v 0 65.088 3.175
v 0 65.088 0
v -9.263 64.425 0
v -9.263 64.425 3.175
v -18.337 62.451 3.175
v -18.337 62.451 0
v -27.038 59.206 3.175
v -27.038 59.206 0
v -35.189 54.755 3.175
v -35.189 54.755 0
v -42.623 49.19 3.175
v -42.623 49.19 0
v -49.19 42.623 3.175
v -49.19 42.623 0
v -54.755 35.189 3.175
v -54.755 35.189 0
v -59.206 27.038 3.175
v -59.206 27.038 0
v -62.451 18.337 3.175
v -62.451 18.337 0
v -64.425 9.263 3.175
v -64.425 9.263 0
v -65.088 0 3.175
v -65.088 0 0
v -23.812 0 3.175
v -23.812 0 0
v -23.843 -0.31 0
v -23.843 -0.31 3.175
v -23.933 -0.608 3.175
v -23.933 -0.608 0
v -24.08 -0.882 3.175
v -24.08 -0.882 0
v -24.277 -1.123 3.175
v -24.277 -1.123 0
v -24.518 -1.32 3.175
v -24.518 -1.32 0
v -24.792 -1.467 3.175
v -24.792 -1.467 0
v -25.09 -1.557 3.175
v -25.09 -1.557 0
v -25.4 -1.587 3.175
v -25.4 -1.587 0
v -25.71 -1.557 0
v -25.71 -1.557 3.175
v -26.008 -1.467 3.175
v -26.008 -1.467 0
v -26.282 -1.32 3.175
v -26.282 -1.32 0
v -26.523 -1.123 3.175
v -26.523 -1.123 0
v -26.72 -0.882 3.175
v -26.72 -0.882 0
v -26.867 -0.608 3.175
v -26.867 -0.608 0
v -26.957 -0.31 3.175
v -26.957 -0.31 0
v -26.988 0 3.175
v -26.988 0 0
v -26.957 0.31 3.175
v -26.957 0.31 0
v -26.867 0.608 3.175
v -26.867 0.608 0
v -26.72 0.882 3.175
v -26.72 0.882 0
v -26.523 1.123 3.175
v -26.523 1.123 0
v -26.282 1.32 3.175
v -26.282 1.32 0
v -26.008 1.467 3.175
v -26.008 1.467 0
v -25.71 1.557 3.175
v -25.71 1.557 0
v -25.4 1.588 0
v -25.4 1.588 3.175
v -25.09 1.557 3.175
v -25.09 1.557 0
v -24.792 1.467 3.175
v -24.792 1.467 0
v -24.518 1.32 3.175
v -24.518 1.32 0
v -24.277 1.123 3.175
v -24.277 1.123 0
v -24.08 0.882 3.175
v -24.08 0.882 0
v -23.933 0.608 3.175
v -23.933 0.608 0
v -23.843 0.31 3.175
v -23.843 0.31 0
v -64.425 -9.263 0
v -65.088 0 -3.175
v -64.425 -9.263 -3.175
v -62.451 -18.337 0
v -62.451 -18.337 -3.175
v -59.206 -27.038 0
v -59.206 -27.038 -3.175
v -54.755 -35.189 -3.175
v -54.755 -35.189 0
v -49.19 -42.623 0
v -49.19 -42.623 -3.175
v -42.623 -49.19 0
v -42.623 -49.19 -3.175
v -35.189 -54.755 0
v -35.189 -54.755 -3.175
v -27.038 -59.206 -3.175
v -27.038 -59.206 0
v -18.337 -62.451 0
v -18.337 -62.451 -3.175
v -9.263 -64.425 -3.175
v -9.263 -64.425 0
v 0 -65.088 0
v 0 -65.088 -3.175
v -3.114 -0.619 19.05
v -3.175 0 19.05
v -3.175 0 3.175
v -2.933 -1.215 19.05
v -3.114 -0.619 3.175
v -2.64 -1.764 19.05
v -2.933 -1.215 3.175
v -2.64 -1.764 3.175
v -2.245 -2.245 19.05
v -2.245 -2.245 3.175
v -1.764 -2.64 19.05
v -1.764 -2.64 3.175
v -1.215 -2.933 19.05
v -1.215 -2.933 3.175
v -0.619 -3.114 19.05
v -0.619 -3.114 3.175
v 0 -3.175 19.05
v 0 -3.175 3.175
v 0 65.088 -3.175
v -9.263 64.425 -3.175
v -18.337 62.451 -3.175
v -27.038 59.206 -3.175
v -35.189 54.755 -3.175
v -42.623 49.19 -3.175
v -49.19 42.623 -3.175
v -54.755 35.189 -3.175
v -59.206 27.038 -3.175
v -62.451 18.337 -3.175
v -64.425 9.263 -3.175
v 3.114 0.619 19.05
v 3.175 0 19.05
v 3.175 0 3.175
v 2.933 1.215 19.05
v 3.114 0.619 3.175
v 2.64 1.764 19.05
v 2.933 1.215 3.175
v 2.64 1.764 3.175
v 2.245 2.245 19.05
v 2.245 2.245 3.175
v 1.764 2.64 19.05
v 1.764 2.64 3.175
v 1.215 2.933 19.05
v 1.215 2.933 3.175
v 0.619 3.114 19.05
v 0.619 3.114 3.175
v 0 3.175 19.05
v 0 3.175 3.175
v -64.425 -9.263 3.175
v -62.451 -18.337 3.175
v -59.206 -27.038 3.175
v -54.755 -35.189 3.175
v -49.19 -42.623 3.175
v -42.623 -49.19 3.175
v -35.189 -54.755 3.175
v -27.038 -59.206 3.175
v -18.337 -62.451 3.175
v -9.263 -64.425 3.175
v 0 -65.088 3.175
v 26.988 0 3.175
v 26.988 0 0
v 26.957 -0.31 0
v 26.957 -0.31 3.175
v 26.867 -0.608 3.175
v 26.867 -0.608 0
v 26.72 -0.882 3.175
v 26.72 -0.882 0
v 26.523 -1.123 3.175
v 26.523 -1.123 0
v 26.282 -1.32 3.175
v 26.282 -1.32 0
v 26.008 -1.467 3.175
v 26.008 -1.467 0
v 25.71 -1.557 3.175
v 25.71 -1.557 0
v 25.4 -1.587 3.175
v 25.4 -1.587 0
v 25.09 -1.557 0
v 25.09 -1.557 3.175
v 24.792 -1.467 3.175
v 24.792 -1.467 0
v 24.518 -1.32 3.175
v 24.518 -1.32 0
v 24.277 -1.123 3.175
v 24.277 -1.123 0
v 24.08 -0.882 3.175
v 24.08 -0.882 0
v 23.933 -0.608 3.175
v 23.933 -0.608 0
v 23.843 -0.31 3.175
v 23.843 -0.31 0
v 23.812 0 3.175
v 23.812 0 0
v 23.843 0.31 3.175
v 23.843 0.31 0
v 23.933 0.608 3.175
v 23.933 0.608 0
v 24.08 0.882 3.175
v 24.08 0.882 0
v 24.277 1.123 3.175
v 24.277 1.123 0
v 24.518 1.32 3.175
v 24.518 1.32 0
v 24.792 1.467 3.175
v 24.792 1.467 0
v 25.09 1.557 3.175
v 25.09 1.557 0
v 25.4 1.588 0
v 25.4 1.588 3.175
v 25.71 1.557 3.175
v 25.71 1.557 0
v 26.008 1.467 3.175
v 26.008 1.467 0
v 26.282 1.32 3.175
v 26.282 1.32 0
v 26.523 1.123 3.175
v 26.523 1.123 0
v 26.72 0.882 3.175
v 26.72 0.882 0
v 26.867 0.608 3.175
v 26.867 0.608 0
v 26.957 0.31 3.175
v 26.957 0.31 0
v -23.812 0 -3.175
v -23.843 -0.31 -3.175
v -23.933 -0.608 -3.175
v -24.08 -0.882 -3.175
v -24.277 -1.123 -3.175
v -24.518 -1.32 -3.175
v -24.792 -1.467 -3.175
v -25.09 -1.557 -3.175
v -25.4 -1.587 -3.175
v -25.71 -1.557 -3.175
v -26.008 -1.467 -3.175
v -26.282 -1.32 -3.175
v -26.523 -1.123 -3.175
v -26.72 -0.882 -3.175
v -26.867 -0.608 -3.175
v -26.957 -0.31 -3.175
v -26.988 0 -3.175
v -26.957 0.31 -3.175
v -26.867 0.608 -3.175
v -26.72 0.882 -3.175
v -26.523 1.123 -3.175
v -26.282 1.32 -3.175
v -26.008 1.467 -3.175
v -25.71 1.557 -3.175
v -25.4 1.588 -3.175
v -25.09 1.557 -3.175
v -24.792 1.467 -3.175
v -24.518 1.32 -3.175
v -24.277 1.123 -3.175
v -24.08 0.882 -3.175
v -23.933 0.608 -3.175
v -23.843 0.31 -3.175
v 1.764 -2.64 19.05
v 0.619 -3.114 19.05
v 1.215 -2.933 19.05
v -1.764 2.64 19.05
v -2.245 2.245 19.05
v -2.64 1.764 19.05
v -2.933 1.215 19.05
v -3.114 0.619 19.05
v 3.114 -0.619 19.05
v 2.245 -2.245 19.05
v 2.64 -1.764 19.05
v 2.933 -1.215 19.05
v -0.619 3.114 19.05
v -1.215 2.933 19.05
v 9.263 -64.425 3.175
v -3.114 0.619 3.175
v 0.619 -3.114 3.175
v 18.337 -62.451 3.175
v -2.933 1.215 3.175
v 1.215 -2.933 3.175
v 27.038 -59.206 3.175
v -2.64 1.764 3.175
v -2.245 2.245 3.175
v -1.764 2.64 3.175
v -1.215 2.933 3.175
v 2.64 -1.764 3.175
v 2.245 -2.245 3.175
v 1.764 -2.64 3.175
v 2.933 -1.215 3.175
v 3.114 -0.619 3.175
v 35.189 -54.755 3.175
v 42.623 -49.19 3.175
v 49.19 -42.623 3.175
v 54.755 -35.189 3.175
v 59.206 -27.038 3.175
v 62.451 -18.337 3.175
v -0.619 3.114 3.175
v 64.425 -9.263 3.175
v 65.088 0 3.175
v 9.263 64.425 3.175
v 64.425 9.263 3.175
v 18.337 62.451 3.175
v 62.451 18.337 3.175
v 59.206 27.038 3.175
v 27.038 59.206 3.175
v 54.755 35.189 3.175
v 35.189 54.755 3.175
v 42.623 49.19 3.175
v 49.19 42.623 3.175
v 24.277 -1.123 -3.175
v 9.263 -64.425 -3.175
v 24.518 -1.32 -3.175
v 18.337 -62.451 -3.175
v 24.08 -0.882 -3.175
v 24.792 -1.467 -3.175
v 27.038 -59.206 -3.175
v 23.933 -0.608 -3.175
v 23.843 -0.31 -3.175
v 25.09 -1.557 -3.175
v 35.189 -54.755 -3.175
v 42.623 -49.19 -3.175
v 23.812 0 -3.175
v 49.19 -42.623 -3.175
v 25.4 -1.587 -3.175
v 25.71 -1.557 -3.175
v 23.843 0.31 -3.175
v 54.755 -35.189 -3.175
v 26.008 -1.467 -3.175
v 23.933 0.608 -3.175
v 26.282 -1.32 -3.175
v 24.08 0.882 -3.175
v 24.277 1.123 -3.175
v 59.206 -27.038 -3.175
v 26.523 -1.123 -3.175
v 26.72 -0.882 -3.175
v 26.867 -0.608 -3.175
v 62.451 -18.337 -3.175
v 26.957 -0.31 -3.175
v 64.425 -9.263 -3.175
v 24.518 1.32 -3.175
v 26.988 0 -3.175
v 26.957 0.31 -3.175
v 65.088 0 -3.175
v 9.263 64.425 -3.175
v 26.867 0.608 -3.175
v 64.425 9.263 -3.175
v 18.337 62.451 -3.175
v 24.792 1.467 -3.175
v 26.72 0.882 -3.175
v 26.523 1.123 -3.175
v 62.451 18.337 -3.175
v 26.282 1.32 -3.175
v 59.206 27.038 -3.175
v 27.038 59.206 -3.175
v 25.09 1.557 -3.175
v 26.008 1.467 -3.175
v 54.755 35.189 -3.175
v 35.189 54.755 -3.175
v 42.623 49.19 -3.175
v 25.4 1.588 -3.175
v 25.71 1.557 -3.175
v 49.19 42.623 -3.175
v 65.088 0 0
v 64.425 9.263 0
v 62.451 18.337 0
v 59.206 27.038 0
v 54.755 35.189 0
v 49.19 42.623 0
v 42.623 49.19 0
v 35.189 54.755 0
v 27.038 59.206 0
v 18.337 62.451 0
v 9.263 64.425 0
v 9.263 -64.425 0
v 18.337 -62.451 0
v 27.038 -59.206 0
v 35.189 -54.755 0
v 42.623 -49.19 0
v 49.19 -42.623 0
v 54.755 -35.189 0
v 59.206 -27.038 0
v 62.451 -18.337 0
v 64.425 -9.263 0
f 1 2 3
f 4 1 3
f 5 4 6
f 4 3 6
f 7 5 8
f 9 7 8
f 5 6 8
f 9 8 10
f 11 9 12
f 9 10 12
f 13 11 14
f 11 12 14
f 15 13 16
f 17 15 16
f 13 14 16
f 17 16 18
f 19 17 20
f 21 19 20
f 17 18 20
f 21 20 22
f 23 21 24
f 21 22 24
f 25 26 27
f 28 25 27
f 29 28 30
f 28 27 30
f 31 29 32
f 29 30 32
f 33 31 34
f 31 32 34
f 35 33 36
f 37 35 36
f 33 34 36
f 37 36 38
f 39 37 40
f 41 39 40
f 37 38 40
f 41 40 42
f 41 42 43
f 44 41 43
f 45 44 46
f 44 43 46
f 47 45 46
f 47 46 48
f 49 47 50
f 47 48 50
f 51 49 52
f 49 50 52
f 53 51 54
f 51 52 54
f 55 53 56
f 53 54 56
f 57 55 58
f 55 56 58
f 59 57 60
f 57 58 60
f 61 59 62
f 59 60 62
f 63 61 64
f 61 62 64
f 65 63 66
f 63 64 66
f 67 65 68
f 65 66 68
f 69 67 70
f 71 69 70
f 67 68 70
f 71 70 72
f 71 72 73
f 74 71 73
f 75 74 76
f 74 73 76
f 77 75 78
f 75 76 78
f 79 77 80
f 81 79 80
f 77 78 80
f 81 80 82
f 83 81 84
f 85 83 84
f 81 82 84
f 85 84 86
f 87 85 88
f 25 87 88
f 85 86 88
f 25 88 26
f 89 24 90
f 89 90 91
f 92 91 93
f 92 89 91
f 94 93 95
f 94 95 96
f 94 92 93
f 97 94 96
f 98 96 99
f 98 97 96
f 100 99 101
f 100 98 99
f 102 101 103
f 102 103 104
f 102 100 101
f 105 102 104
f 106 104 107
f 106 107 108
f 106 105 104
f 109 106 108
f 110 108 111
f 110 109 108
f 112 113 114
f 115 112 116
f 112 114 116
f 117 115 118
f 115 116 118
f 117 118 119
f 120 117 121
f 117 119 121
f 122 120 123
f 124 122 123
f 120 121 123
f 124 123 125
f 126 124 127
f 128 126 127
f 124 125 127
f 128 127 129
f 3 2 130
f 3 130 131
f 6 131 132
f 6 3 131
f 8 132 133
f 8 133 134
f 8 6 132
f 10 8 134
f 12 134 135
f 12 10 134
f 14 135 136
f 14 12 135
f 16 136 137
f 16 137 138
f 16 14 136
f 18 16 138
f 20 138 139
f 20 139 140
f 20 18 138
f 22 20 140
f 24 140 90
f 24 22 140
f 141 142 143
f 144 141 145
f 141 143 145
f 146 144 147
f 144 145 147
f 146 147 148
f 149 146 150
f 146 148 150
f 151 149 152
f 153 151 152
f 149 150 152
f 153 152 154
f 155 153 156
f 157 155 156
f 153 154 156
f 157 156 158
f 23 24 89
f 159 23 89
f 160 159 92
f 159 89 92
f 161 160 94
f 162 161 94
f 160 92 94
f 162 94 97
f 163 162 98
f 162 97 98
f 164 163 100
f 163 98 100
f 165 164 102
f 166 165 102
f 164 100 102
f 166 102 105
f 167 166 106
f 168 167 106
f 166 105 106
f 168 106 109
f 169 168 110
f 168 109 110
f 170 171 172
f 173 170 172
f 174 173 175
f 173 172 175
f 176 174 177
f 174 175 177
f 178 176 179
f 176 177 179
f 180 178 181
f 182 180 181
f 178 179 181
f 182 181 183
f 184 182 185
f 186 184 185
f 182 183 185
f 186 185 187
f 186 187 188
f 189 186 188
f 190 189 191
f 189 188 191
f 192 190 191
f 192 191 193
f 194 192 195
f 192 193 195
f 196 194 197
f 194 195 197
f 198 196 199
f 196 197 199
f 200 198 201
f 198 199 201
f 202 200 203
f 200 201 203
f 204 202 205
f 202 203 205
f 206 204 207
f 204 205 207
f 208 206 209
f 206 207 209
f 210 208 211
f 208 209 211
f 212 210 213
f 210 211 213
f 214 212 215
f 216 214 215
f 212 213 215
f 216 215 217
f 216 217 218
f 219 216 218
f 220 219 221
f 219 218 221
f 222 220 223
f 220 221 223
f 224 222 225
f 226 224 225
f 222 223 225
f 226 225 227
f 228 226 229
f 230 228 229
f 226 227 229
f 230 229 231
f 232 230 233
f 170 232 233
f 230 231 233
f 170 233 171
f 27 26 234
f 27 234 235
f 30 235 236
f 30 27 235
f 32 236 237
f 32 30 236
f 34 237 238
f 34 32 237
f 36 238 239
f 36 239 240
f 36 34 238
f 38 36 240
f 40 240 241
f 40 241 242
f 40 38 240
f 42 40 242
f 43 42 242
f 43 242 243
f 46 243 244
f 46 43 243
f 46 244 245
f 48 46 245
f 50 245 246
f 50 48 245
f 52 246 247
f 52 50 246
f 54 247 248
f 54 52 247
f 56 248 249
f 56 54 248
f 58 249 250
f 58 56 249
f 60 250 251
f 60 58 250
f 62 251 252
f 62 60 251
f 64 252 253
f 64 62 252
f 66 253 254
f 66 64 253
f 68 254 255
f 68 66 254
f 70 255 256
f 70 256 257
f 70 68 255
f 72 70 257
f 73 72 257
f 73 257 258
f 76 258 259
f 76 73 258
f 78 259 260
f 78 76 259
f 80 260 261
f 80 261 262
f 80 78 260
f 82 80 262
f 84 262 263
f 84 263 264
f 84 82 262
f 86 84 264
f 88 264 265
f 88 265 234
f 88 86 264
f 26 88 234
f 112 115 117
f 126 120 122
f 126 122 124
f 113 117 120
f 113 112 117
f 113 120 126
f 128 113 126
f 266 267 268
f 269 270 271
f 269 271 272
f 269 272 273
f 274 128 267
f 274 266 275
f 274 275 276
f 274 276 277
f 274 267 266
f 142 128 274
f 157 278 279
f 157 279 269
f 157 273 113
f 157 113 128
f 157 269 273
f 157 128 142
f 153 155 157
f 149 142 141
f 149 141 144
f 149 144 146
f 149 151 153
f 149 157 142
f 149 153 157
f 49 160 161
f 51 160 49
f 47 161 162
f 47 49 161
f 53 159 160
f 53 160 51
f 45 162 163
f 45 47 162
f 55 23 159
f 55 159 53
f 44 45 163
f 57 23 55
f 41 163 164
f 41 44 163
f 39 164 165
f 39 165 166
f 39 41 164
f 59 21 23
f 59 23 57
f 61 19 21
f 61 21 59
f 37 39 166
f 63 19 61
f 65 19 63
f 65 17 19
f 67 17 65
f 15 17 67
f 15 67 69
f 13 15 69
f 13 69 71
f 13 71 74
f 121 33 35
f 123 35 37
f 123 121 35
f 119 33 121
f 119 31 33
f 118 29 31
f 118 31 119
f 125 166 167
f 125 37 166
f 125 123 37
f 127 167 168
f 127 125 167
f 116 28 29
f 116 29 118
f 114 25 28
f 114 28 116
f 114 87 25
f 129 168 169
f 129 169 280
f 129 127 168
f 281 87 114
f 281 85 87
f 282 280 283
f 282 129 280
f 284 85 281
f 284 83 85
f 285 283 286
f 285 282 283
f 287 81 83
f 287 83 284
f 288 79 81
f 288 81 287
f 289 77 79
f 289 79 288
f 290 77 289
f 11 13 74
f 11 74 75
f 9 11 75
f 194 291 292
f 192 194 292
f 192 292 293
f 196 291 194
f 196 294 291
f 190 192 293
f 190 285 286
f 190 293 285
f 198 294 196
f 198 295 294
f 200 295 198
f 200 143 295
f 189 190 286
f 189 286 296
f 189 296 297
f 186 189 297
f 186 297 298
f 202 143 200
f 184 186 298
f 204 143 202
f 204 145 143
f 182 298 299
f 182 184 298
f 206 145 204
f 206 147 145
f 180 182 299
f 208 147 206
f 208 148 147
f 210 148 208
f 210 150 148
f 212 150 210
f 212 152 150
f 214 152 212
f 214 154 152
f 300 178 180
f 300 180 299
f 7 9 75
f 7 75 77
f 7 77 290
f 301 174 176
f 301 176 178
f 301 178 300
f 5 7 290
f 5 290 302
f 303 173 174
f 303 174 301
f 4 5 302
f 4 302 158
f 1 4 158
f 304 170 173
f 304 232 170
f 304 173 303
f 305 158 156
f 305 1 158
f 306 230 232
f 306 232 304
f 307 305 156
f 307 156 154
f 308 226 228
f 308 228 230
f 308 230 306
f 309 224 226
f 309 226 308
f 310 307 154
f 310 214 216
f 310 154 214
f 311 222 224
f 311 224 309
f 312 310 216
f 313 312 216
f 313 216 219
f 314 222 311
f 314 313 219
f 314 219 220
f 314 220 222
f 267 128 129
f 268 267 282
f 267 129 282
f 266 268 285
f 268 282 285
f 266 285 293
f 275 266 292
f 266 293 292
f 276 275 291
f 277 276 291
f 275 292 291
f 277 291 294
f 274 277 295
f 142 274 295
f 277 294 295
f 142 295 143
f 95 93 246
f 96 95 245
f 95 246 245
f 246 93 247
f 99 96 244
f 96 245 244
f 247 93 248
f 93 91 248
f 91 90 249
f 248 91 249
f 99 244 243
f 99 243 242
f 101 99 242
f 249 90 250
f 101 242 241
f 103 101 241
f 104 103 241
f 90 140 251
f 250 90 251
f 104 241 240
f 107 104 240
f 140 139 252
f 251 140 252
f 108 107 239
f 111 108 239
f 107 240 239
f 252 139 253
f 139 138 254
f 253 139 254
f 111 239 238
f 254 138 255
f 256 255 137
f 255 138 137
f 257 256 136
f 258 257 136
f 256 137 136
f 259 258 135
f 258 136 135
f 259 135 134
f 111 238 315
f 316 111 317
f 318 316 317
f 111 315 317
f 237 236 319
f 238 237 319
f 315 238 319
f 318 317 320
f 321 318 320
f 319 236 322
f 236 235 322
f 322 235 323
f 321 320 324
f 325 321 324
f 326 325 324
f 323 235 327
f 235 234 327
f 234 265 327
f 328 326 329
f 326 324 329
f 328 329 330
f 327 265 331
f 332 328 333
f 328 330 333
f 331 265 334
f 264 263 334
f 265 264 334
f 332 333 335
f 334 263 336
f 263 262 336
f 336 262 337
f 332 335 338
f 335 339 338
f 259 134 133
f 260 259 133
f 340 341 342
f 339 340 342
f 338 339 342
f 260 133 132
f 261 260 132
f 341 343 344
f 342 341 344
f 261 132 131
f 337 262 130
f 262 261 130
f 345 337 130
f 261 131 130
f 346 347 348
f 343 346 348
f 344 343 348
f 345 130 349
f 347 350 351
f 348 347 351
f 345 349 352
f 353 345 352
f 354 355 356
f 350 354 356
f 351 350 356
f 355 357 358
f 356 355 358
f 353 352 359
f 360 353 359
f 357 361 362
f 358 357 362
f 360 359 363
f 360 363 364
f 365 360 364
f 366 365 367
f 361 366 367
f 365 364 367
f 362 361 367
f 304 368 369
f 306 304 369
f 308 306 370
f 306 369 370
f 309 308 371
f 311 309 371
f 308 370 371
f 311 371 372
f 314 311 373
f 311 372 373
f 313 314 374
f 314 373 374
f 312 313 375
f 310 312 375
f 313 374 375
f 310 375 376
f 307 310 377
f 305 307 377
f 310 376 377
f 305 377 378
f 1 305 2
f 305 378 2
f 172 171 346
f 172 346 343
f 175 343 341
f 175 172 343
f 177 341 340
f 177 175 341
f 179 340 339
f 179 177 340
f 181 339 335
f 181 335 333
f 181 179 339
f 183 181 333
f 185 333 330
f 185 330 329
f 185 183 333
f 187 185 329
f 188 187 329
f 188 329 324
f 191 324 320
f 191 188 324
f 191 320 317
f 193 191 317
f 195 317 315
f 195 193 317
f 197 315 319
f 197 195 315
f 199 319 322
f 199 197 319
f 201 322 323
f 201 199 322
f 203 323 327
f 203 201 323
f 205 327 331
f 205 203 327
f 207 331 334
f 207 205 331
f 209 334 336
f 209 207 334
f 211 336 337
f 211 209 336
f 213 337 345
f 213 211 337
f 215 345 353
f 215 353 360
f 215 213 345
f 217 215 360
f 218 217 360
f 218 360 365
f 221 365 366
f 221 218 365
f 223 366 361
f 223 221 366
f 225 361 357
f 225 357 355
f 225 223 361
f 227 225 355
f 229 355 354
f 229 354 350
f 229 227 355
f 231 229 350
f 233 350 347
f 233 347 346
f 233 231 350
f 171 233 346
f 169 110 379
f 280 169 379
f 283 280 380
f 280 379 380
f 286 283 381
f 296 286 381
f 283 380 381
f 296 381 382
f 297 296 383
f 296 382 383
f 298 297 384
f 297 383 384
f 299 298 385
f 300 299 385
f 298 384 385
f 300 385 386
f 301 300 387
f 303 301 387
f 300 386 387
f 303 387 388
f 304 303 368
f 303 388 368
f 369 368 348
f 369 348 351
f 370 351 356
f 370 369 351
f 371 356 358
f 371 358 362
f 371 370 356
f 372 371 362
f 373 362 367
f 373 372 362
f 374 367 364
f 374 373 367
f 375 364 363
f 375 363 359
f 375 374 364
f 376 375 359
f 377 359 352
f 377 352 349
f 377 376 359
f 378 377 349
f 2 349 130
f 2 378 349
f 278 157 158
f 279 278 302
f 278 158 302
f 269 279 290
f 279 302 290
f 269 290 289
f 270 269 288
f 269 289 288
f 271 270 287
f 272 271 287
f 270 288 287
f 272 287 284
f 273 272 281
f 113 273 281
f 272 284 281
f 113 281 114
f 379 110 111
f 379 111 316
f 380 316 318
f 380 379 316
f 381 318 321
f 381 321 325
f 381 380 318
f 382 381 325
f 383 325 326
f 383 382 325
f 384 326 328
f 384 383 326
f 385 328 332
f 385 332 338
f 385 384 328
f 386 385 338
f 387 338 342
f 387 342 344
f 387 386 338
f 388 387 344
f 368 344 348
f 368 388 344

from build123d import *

# Parameters (mm, degrees)
F1_DEPTH = 19.05
F2_DEPTH = 3.175
F3_DEPTH = 3.175


with BuildPart() as f1:
    # F0 (on Top) → F1 (new body)
    with BuildSketch(Plane.XY):
        with BuildLine():
            ThreePointArc((3.175, 0), (2.2450640303, 2.2450640303), (0, 3.175))
            Line((0, 3.175), (0, 0))
            Line((0, 0), (3.175, 0))
        make_face()
        with BuildLine():
            Line((0, 0), (0, 3.175))
            ThreePointArc((0, 3.175), (-2.2450640303, 2.2450640303), (-3.175, 0))
            Line((-3.175, 0), (0, 0))
        make_face()
        with BuildLine():
            ThreePointArc((-3.175, 0), (-2.2450640303, -2.2450640303), (0, -3.175))
            Line((0, -3.175), (0, 0))
            Line((0, 0), (-3.175, 0))
        make_face()
        with BuildLine():
            Line((0, 0), (0, -3.175))
            ThreePointArc((0, -3.175), (2.2450640303, -2.2450640303), (3.175, 0))
            Line((3.175, 0), (0, 0))
        make_face()
    extrude(amount=F1_DEPTH)

    # F0 (on Top) → F2 (join)
    with BuildSketch(Plane.XY):
        with BuildLine():
            Line((26.9875, 0), (65.0875, 0))
            ThreePointArc((65.0875, 0), (46.0238126205, 46.0238126205), (0, 65.0875))
            Line((0, 65.0875), (0, 3.175))
            ThreePointArc((0, 3.175), (2.2450640303, 2.2450640303), (3.175, 0))
            Line((3.175, 0), (23.8125, 0))
            ThreePointArc((23.8125, 0), (25.4, 1.5875), (26.9875, 0))
        make_face()
        with BuildLine():
            ThreePointArc((0, -65.0875), (46.0238126205, -46.0238126205), (65.0875, 0))
            Line((65.0875, 0), (26.9875, 0))
            ThreePointArc((26.9875, 0), (25.4, -1.5875), (23.8125, 0))
            Line((23.8125, 0), (3.175, 0))
            ThreePointArc((3.175, 0), (2.2450640303, -2.2450640303), (0, -3.175))
            Line((0, -3.175), (0, -65.0875))
        make_face()
        with BuildLine():
            Line((0, 3.175), (0, 65.0875))
            ThreePointArc((0, 65.0875), (-46.0238126205, 46.0238126205), (-65.0875, 0))
            Line((-65.0875, 0), (-26.9875, 0))
            ThreePointArc((-26.9875, 0), (-25.4, 1.5875), (-23.8125, 0))
            Line((-23.8125, 0), (-3.175, 0))
            ThreePointArc((-3.175, 0), (-2.2450640303, 2.2450640303), (0, 3.175))
        make_face()
        with BuildLine():
            ThreePointArc((-65.0875, 0), (-46.0238126205, -46.0238126205), (0, -65.0875))
            Line((0, -65.0875), (0, -3.175))
            ThreePointArc((0, -3.175), (-2.2450640303, -2.2450640303), (-3.175, 0))
            Line((-3.175, 0), (-23.8125, 0))
            ThreePointArc((-23.8125, 0), (-25.4, -1.5875), (-26.9875, 0))
            Line((-26.9875, 0), (-65.0875, 0))
        make_face()
    extrude(amount=F2_DEPTH)

    # F3 (add): a face of the model
    f3_faces = [f1.faces().sort_by_distance(p)[0] for p in [
        (0, 0, 0),
    ]]
    extrude(f3_faces, amount=F3_DEPTH)


solid = f1.part
